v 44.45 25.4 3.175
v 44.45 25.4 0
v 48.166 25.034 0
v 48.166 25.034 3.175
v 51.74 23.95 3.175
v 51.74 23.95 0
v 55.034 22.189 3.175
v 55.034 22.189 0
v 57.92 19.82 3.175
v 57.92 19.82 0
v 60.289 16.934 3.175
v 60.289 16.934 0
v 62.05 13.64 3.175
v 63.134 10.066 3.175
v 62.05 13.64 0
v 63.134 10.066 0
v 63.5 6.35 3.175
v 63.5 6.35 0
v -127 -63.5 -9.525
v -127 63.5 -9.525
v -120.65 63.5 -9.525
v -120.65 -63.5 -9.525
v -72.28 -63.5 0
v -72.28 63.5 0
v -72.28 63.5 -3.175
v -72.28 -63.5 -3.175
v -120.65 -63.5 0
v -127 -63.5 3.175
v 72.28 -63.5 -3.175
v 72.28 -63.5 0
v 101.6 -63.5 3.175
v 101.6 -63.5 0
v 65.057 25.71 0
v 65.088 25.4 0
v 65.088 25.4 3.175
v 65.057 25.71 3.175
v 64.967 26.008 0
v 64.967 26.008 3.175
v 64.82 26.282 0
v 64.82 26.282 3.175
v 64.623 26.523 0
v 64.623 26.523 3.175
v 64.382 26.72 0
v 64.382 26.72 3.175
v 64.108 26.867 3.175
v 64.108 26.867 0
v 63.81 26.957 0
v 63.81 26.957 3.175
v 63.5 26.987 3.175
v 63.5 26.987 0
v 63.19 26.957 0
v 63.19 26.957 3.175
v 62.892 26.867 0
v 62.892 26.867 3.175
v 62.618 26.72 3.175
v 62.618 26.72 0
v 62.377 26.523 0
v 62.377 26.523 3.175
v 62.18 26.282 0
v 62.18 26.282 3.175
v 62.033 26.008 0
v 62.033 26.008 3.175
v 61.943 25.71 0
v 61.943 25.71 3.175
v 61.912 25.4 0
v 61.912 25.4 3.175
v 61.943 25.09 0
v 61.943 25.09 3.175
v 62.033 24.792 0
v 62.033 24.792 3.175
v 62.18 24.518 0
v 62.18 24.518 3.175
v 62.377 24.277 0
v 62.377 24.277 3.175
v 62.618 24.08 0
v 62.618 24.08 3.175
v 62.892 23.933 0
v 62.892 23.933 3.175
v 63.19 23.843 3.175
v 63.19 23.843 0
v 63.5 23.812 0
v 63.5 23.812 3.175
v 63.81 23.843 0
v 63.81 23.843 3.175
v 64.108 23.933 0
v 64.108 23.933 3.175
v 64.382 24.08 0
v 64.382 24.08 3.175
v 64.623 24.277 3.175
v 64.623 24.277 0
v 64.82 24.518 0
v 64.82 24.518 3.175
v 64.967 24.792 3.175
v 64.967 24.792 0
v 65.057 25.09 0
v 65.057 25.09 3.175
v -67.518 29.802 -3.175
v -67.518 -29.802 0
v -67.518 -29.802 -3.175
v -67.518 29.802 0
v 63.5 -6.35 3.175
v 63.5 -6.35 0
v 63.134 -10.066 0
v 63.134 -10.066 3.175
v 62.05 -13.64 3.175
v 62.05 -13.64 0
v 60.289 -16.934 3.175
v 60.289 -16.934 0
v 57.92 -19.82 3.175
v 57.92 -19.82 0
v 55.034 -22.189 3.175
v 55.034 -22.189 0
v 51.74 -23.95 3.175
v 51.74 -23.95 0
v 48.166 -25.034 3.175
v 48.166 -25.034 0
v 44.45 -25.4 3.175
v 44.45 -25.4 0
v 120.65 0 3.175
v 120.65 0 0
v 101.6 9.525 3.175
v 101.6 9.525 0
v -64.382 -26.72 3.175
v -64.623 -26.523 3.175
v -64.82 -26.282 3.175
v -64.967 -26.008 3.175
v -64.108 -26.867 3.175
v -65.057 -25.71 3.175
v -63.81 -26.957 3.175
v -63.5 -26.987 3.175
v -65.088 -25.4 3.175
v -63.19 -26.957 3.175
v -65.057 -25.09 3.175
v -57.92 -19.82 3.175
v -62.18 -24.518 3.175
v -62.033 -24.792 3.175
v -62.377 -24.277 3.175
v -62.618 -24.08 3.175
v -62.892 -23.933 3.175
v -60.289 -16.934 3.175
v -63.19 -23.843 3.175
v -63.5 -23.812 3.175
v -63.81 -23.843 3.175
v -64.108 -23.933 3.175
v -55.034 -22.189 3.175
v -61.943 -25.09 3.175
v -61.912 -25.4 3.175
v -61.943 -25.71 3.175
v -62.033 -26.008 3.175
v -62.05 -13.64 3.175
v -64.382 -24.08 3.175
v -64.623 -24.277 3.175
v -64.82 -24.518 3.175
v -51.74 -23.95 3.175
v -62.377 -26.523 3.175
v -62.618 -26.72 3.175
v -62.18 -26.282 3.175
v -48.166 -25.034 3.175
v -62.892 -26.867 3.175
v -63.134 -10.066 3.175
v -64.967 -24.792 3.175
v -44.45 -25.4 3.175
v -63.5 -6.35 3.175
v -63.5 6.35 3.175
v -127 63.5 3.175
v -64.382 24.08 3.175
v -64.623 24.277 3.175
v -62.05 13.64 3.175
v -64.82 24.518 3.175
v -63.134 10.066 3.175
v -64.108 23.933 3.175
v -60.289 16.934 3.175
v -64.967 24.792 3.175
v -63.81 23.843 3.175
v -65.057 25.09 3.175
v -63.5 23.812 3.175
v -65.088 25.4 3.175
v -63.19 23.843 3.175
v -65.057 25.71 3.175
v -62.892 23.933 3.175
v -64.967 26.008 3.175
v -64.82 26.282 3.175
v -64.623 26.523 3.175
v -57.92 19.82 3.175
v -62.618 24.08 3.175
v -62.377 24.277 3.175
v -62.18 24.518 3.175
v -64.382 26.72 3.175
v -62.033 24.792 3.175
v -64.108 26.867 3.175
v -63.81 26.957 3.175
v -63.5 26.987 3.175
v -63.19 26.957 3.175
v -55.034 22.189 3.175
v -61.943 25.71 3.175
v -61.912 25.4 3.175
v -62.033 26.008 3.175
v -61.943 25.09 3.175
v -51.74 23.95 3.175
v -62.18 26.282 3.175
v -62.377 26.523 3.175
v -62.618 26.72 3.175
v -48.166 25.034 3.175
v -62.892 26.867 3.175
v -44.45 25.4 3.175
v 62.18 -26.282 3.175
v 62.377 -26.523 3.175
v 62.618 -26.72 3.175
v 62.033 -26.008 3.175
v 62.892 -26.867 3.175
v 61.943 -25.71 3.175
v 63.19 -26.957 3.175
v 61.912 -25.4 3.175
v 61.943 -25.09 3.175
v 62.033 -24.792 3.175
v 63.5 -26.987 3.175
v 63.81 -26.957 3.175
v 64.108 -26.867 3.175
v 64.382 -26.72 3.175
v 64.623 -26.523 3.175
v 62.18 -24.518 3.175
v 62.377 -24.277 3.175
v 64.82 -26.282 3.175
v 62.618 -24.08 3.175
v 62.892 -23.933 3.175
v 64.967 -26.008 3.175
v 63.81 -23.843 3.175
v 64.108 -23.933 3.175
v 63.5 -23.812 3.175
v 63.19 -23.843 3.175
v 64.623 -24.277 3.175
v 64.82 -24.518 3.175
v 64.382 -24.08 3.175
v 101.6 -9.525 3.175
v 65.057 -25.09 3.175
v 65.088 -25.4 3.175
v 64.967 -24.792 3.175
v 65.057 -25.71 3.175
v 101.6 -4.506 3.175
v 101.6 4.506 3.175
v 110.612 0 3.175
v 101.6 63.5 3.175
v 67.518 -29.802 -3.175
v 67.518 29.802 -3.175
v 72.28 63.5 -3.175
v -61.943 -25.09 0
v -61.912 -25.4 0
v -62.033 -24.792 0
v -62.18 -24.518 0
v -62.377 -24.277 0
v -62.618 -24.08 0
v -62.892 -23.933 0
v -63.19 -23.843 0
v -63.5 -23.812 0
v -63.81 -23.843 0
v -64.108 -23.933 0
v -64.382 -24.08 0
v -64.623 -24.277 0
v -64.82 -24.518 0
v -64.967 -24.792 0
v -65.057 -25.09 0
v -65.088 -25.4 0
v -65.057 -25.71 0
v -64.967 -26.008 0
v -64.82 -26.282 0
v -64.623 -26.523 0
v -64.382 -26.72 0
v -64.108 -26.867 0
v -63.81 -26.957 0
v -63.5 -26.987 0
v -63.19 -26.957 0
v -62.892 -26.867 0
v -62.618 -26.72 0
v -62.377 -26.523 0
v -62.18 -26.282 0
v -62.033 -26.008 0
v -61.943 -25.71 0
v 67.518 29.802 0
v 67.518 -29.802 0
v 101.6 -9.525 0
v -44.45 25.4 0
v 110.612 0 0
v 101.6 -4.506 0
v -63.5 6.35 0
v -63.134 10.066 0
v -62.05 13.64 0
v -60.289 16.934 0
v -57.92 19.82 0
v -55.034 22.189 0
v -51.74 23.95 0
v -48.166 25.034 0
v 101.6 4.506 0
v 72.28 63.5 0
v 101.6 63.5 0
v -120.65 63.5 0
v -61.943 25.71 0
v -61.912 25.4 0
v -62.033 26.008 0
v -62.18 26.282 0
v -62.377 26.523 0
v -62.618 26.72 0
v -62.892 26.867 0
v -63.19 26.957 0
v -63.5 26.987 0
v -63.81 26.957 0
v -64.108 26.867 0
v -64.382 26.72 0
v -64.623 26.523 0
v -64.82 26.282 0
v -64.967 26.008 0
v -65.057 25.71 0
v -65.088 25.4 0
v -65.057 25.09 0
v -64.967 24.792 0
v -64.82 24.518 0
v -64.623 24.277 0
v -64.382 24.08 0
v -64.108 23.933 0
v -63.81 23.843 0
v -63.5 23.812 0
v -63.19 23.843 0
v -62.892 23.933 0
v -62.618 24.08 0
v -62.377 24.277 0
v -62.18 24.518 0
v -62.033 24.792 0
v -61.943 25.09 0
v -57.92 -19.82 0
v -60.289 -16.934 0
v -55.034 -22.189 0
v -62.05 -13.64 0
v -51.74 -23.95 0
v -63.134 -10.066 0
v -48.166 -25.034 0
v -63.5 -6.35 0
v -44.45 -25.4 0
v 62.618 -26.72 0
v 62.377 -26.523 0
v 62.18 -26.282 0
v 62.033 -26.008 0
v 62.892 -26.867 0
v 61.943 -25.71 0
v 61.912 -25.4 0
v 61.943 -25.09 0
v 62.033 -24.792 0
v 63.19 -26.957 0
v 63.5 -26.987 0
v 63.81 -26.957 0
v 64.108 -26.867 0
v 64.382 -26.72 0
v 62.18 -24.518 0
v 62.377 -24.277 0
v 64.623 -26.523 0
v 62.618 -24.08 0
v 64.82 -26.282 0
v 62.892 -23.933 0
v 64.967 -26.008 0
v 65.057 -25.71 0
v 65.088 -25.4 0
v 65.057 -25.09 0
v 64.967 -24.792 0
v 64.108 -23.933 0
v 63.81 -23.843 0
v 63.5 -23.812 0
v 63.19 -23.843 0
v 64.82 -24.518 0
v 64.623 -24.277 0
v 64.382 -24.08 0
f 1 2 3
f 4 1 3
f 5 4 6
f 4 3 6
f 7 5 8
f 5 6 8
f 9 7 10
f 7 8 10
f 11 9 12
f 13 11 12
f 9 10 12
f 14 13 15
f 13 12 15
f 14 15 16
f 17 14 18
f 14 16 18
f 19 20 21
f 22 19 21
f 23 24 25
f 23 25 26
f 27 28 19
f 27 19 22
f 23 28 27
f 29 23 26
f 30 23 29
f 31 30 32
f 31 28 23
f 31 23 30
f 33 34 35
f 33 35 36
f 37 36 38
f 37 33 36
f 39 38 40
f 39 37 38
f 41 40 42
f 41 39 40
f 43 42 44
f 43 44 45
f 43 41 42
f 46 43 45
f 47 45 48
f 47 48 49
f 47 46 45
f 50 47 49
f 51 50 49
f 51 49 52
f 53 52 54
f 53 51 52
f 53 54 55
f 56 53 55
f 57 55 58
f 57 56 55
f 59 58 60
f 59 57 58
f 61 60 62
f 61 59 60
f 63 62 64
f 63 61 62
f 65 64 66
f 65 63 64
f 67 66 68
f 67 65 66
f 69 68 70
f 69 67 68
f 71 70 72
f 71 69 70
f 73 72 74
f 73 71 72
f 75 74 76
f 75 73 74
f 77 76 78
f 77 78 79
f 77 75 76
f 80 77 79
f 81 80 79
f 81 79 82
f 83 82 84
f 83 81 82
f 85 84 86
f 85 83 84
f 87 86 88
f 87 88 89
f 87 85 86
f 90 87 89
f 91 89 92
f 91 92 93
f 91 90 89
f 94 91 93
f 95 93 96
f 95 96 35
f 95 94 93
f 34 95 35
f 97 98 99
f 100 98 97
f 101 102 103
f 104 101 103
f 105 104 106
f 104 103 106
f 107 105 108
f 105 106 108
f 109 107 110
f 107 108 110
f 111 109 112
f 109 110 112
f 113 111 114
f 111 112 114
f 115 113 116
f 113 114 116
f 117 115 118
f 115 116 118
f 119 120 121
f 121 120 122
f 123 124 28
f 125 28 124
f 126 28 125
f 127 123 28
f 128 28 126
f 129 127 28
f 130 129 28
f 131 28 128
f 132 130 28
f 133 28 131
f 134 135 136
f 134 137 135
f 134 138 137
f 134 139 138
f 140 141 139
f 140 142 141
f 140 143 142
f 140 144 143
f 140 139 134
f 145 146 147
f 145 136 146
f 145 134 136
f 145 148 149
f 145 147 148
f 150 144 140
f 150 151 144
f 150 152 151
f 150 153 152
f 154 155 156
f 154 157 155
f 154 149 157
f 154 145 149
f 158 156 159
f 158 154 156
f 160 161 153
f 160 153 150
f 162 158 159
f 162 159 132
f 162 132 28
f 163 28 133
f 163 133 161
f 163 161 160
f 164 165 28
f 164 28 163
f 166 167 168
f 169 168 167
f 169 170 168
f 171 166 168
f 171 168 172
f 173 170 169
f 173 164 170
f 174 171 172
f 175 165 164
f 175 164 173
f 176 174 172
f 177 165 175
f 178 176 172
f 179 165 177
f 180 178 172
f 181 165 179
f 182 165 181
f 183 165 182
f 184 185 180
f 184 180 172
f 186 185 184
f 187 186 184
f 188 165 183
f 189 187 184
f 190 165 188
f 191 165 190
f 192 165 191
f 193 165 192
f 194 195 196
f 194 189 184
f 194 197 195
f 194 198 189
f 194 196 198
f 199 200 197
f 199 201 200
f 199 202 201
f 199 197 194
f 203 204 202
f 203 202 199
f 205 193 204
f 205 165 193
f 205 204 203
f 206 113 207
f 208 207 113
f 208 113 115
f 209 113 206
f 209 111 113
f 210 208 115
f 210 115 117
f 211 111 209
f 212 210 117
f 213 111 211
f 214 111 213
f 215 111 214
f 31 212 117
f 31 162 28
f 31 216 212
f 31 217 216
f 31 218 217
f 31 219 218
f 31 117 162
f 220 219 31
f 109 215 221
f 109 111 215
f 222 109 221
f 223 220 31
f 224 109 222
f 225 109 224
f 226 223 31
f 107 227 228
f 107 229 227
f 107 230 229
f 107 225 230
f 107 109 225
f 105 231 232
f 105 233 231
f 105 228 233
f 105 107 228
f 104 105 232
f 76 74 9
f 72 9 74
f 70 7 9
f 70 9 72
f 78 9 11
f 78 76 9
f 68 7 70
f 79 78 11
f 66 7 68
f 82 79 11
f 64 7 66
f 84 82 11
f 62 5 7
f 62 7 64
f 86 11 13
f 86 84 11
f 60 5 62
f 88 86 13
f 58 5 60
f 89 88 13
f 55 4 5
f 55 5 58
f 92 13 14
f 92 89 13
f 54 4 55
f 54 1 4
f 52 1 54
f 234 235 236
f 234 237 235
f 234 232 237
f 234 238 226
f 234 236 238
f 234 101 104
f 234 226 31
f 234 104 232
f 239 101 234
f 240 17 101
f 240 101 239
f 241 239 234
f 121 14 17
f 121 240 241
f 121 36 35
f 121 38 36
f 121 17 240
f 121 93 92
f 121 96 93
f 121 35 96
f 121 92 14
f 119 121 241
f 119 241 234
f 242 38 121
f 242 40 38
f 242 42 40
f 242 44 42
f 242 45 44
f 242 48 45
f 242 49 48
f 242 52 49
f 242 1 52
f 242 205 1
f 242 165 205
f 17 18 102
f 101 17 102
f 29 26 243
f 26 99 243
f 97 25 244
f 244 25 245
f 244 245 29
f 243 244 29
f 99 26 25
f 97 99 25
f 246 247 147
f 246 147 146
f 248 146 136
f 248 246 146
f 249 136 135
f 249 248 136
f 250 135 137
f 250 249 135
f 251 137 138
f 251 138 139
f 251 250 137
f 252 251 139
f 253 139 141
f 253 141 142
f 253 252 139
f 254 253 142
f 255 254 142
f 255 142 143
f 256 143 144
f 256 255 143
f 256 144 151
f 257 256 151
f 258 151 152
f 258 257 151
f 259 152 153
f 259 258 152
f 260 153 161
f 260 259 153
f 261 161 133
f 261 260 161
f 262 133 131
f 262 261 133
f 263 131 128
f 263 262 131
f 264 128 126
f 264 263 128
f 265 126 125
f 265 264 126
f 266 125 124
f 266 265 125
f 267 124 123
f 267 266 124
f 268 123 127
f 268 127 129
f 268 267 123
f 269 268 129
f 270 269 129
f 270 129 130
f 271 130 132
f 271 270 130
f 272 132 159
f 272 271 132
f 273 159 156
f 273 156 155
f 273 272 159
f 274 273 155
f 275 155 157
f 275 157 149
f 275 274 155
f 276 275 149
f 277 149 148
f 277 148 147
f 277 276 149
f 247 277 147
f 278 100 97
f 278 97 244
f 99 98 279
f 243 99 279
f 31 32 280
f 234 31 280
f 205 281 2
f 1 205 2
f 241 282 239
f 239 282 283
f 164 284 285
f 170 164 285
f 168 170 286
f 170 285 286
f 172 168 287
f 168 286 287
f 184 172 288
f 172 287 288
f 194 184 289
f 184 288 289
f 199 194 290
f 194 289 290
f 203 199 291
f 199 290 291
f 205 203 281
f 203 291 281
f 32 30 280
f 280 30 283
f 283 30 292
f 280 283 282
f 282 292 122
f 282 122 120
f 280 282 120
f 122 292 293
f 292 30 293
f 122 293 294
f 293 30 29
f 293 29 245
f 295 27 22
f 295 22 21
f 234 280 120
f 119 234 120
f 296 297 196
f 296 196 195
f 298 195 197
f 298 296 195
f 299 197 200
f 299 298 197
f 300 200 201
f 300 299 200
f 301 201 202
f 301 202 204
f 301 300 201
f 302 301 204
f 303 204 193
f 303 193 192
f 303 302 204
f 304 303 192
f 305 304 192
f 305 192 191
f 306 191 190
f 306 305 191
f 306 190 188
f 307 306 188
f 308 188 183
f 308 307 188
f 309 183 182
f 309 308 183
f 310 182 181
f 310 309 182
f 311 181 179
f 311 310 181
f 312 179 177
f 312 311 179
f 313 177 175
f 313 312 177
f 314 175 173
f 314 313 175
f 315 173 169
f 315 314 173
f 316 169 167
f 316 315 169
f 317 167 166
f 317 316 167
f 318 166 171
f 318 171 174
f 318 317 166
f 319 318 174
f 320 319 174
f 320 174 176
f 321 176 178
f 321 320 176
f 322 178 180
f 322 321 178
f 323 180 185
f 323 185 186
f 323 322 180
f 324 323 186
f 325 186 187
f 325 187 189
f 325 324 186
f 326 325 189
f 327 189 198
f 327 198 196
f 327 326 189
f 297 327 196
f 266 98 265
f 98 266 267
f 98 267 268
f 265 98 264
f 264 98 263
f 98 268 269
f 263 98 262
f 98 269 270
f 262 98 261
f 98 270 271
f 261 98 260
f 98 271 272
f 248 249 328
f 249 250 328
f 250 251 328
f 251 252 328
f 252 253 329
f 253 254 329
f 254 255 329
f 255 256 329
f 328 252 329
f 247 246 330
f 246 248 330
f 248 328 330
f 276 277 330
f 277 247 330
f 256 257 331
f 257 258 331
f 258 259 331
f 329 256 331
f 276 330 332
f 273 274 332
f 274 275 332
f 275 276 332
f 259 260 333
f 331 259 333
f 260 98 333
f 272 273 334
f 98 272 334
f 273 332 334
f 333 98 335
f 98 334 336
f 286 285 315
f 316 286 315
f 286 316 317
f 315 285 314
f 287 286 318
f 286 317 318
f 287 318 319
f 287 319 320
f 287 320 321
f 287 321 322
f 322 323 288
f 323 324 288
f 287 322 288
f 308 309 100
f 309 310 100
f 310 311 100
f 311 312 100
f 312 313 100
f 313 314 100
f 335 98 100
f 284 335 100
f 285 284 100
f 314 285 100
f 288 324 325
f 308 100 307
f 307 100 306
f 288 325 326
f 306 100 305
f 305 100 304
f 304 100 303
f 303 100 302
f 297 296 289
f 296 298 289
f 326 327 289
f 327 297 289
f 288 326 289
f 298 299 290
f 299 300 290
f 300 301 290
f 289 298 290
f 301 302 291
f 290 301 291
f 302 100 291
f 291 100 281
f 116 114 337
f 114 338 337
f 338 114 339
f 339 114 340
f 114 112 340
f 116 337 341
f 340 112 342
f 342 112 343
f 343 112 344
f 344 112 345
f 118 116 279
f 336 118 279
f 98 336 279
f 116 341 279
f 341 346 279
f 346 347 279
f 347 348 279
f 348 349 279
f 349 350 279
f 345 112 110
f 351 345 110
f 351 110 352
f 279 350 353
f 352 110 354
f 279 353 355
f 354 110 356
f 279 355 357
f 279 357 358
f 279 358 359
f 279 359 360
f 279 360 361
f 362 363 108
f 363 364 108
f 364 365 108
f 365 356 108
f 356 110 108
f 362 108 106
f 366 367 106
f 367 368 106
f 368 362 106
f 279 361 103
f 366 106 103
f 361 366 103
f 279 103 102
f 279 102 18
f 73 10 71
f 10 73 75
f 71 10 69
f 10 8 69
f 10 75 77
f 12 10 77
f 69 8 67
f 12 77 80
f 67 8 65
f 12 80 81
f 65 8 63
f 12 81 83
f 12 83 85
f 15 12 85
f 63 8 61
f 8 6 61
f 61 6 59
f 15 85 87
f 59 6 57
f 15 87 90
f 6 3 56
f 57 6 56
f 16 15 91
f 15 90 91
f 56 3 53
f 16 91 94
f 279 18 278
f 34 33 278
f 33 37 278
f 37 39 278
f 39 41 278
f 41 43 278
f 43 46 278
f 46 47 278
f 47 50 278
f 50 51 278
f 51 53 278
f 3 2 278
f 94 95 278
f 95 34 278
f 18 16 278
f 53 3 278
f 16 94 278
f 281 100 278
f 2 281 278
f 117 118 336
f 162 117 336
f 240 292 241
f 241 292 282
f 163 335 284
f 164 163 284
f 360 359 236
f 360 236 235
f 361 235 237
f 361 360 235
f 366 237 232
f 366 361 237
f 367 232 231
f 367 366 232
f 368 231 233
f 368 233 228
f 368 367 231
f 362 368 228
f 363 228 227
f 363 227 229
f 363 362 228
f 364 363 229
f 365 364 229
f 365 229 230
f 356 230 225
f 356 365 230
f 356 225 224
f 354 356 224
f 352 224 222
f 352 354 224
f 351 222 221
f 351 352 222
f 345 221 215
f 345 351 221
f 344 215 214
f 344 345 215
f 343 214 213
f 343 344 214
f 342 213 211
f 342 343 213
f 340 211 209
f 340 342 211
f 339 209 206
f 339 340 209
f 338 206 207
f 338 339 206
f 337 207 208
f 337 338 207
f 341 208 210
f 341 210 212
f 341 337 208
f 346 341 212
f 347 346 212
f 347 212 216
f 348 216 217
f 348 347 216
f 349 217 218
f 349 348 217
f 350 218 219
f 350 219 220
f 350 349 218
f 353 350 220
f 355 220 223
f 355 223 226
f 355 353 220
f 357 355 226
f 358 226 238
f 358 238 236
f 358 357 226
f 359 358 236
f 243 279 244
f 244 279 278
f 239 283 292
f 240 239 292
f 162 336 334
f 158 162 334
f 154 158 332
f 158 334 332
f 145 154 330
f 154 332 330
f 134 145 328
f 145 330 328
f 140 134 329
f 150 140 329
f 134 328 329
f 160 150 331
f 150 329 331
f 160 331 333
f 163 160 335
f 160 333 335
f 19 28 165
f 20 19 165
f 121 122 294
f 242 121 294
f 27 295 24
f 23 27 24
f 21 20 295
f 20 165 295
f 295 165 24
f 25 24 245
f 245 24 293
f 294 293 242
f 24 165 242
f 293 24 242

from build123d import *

# Parameters (mm, degrees)
F0_W     = 144.560187006
F0_H     = 69.128523463
F0_W_2   = 135.035187006
F0_H_2   = 59.603523463
F0_R     = 1.5875
F0_H_3   = 28.9357382685
F0_W_3   = 6.35
F0_H_4   = 127
F1_DEPTH = 3.175
F2_DEPTH = 3.175
F3_DEPTH = 9.525


with BuildPart() as f1:
    # F0 (on Top) → F1 (new body)
    with BuildSketch(Plane.XY):
        Rectangle(F0_W, F0_H)
        Rectangle(F0_W_2, F0_H_2, mode=Mode.SUBTRACT)
        Rectangle(F0_W_2, F0_H_2)
        with Locations((-63.5, -25.4)):
            Circle(F0_R, mode=Mode.SUBTRACT)
        with Locations((63.5, -25.4)):
            Circle(F0_R, mode=Mode.SUBTRACT)
        with Locations((-63.5, 25.4)):
            Circle(F0_R, mode=Mode.SUBTRACT)
        with BuildLine():
            ThreePointArc((63.5, -6.35), (57.9203841816, -19.8203841816), (44.45, -25.4))
            Line((44.45, -25.4), (-44.45, -25.4))
            ThreePointArc((-44.45, -25.4), (-57.9203841816, -19.8203841816), (-63.5, -6.35))
            Line((-63.5, -6.35), (-63.5, 6.35))
            ThreePointArc((-63.5, 6.35), (-57.9203841816, 19.8203841816), (-44.45, 25.4))
            Line((-44.45, 25.4), (44.45, 25.4))
            ThreePointArc((44.45, 25.4), (57.9203841816, 19.8203841816), (63.5, 6.35))
            Line((63.5, 6.35), (63.5, -6.35))
        make_face(mode=Mode.SUBTRACT)
        with Locations((63.5, 25.4)):
            Circle(F0_R, mode=Mode.SUBTRACT)
        Polygon((-120.65, -63.5), (-72.280093503, -63.5), (-72.280093503, -34.5642617315), (-72.280093503, 34.5642617315), (-72.280093503, 63.5), (-120.65, 63.5), align=None)
        with Locations((0, -49.0321308658)):
            Rectangle(F0_W, F0_H_3)
        with Locations((0, 49.0321308658)):
            Rectangle(F0_W, F0_H_3)
        Polygon((72.280093503, -63.5), (101.6, -63.5), (101.6, -9.525), (120.65, 0), (101.6, 9.525), (101.6, 63.5), (72.280093503, 63.5), (72.280093503, 34.5642617315), (72.280093503, -34.5642617315), align=None)
        Polygon((110.612402501, 0), (101.6, -4.5062012505), (101.6, 4.5062012505), align=None, mode=Mode.SUBTRACT)
        with Locations((-123.825, 0)):
            Rectangle(F0_W_3, F0_H_4)
    extrude(amount=F1_DEPTH)

    # F0 (on Top) → F2 (join)
    with BuildSketch(Plane.XY):
        with Locations((0, -49.0321308658)):
            Rectangle(F0_W, F0_H_3)
        Rectangle(F0_W, F0_H)
        Rectangle(F0_W_2, F0_H_2, mode=Mode.SUBTRACT)
        with Locations((0, 49.0321308658)):
            Rectangle(F0_W, F0_H_3)
    extrude(amount=-F2_DEPTH)

    # F0 (on Top) → F3 (join)
    with BuildSketch(Plane.XY):
        with Locations((-123.825, 0)):
            Rectangle(F0_W_3, F0_H_4)
    extrude(amount=-F3_DEPTH)


solid = f1.part
